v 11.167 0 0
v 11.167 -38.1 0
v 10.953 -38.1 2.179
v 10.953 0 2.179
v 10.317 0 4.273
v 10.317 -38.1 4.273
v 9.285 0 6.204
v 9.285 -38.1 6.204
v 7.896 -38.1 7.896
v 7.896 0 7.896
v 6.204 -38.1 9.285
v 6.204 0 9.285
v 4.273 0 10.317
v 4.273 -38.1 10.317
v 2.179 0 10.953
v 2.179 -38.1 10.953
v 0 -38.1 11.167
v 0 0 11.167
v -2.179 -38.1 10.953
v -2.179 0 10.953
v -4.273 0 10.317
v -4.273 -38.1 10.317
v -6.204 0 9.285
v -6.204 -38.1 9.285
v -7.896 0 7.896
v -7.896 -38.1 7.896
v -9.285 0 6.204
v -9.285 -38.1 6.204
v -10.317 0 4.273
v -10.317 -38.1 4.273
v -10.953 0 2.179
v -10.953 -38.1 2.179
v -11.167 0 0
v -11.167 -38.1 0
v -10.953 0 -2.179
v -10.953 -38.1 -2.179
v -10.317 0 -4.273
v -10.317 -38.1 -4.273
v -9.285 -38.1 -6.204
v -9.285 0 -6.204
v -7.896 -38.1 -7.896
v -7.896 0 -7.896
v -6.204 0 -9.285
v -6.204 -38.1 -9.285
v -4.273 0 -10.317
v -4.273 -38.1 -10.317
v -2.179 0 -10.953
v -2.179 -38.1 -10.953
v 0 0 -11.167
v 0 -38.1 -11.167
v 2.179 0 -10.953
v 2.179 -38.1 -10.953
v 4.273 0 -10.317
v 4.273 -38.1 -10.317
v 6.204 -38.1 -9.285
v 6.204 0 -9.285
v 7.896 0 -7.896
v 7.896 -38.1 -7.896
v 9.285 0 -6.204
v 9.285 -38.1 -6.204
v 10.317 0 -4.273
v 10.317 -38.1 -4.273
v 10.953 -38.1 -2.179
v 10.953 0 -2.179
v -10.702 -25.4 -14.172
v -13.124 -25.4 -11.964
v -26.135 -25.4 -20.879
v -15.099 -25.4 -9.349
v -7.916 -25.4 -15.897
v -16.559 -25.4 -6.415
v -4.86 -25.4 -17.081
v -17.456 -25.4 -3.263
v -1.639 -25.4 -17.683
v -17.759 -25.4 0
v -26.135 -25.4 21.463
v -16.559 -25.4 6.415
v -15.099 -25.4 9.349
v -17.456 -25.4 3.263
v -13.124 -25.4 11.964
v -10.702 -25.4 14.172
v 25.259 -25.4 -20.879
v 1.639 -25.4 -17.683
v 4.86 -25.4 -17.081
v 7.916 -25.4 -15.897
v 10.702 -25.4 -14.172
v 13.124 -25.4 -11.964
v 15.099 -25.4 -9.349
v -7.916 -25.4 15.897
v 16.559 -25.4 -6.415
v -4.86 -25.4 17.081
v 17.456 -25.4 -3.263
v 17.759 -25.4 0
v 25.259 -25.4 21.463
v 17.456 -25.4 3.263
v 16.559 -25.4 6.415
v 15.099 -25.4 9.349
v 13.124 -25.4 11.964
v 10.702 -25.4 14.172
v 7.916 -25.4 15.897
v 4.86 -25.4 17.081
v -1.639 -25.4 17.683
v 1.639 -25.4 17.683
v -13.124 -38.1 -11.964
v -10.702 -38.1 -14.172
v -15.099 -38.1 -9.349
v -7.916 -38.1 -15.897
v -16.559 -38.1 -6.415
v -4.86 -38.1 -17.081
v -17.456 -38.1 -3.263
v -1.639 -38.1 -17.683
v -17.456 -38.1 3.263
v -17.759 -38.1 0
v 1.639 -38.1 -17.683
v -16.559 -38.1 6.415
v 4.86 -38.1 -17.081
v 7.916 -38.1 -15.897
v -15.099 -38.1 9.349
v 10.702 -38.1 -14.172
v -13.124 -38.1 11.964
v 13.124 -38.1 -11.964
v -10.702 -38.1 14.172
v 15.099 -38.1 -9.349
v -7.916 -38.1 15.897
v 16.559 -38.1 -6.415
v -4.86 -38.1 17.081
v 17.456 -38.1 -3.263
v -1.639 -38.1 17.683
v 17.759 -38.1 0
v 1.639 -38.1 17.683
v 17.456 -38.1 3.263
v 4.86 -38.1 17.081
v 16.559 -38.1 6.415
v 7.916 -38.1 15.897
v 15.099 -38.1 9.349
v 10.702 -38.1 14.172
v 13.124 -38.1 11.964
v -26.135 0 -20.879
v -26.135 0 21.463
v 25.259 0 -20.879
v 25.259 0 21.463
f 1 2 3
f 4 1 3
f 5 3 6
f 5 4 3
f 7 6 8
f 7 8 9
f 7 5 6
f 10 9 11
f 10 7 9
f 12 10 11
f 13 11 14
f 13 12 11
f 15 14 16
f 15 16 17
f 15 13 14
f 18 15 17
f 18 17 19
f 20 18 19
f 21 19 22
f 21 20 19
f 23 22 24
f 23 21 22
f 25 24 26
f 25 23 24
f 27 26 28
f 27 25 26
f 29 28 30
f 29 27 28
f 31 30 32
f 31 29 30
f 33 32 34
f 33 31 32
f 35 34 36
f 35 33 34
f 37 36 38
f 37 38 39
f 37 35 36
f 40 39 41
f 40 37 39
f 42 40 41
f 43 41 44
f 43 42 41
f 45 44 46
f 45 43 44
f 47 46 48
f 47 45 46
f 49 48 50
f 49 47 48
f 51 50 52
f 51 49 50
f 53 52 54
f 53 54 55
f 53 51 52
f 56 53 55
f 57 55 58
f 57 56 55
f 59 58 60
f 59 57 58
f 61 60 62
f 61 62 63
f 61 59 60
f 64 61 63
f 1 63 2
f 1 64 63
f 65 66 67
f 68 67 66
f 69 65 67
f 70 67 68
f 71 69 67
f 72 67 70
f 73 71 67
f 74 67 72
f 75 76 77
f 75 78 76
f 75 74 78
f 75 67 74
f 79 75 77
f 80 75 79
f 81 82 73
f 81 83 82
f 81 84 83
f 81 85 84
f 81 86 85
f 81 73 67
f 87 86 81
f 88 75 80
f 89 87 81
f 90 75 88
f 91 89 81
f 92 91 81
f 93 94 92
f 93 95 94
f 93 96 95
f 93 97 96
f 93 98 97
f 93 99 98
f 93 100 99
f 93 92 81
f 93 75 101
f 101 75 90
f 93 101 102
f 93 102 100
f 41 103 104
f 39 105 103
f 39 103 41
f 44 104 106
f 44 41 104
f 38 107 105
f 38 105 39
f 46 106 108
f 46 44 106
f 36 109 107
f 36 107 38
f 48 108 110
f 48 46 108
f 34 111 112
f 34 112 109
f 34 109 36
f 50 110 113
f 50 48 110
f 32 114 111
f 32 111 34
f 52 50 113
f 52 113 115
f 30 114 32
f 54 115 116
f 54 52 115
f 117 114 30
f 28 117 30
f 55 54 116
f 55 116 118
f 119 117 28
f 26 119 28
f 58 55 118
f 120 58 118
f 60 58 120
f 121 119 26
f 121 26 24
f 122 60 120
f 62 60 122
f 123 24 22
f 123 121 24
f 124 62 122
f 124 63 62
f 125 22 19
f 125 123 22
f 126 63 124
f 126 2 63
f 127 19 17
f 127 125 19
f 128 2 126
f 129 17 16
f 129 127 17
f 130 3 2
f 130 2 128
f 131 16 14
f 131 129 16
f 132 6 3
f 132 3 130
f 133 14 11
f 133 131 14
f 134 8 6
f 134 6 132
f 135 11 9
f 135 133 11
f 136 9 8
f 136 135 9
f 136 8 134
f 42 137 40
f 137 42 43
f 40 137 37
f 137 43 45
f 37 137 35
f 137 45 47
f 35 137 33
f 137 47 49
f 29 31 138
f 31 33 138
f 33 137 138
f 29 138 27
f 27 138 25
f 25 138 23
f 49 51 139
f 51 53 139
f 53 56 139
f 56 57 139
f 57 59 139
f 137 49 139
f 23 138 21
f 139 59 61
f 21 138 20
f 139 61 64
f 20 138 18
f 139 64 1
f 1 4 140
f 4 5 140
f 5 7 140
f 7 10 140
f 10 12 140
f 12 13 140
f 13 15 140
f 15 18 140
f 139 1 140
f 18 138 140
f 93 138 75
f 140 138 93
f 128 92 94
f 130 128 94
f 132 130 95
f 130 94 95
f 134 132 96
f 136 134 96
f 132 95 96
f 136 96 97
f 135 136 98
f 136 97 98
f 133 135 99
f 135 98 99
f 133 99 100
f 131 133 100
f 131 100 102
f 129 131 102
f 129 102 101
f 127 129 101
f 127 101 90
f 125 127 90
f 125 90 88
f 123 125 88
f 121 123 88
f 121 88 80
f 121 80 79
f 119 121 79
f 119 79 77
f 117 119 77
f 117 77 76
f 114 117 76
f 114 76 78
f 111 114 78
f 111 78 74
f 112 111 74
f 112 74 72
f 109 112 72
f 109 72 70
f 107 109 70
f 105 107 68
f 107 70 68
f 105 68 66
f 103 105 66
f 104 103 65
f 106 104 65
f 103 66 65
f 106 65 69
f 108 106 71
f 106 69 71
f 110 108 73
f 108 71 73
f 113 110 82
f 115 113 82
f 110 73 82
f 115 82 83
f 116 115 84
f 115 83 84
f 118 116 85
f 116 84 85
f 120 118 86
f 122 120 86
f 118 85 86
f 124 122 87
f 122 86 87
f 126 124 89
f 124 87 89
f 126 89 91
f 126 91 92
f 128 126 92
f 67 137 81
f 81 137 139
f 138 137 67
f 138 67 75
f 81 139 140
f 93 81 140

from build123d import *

# Parameters (mm, degrees)
F0_R     = 17.758511
F0_R_2   = 11.167133
F1_DEPTH = 38.1
F0_W     = 51.393282
F0_H     = 42.341057
F2_DEPTH = 25.4


with BuildPart() as f1:
    # F0 (on Front) → F1 (new body)
    with BuildSketch(Plane.XZ):
        Circle(F0_R)
        Circle(F0_R_2, mode=Mode.SUBTRACT)
    extrude(amount=F1_DEPTH)

    # F0 (on Front) → F2 (join)
    with BuildSketch(Plane.XZ):
        with Locations((-0.438012, 0.292006)):
            Rectangle(F0_W, F0_H)
        Circle(F0_R, mode=Mode.SUBTRACT)
    extrude(amount=F2_DEPTH)


solid = f1.part
